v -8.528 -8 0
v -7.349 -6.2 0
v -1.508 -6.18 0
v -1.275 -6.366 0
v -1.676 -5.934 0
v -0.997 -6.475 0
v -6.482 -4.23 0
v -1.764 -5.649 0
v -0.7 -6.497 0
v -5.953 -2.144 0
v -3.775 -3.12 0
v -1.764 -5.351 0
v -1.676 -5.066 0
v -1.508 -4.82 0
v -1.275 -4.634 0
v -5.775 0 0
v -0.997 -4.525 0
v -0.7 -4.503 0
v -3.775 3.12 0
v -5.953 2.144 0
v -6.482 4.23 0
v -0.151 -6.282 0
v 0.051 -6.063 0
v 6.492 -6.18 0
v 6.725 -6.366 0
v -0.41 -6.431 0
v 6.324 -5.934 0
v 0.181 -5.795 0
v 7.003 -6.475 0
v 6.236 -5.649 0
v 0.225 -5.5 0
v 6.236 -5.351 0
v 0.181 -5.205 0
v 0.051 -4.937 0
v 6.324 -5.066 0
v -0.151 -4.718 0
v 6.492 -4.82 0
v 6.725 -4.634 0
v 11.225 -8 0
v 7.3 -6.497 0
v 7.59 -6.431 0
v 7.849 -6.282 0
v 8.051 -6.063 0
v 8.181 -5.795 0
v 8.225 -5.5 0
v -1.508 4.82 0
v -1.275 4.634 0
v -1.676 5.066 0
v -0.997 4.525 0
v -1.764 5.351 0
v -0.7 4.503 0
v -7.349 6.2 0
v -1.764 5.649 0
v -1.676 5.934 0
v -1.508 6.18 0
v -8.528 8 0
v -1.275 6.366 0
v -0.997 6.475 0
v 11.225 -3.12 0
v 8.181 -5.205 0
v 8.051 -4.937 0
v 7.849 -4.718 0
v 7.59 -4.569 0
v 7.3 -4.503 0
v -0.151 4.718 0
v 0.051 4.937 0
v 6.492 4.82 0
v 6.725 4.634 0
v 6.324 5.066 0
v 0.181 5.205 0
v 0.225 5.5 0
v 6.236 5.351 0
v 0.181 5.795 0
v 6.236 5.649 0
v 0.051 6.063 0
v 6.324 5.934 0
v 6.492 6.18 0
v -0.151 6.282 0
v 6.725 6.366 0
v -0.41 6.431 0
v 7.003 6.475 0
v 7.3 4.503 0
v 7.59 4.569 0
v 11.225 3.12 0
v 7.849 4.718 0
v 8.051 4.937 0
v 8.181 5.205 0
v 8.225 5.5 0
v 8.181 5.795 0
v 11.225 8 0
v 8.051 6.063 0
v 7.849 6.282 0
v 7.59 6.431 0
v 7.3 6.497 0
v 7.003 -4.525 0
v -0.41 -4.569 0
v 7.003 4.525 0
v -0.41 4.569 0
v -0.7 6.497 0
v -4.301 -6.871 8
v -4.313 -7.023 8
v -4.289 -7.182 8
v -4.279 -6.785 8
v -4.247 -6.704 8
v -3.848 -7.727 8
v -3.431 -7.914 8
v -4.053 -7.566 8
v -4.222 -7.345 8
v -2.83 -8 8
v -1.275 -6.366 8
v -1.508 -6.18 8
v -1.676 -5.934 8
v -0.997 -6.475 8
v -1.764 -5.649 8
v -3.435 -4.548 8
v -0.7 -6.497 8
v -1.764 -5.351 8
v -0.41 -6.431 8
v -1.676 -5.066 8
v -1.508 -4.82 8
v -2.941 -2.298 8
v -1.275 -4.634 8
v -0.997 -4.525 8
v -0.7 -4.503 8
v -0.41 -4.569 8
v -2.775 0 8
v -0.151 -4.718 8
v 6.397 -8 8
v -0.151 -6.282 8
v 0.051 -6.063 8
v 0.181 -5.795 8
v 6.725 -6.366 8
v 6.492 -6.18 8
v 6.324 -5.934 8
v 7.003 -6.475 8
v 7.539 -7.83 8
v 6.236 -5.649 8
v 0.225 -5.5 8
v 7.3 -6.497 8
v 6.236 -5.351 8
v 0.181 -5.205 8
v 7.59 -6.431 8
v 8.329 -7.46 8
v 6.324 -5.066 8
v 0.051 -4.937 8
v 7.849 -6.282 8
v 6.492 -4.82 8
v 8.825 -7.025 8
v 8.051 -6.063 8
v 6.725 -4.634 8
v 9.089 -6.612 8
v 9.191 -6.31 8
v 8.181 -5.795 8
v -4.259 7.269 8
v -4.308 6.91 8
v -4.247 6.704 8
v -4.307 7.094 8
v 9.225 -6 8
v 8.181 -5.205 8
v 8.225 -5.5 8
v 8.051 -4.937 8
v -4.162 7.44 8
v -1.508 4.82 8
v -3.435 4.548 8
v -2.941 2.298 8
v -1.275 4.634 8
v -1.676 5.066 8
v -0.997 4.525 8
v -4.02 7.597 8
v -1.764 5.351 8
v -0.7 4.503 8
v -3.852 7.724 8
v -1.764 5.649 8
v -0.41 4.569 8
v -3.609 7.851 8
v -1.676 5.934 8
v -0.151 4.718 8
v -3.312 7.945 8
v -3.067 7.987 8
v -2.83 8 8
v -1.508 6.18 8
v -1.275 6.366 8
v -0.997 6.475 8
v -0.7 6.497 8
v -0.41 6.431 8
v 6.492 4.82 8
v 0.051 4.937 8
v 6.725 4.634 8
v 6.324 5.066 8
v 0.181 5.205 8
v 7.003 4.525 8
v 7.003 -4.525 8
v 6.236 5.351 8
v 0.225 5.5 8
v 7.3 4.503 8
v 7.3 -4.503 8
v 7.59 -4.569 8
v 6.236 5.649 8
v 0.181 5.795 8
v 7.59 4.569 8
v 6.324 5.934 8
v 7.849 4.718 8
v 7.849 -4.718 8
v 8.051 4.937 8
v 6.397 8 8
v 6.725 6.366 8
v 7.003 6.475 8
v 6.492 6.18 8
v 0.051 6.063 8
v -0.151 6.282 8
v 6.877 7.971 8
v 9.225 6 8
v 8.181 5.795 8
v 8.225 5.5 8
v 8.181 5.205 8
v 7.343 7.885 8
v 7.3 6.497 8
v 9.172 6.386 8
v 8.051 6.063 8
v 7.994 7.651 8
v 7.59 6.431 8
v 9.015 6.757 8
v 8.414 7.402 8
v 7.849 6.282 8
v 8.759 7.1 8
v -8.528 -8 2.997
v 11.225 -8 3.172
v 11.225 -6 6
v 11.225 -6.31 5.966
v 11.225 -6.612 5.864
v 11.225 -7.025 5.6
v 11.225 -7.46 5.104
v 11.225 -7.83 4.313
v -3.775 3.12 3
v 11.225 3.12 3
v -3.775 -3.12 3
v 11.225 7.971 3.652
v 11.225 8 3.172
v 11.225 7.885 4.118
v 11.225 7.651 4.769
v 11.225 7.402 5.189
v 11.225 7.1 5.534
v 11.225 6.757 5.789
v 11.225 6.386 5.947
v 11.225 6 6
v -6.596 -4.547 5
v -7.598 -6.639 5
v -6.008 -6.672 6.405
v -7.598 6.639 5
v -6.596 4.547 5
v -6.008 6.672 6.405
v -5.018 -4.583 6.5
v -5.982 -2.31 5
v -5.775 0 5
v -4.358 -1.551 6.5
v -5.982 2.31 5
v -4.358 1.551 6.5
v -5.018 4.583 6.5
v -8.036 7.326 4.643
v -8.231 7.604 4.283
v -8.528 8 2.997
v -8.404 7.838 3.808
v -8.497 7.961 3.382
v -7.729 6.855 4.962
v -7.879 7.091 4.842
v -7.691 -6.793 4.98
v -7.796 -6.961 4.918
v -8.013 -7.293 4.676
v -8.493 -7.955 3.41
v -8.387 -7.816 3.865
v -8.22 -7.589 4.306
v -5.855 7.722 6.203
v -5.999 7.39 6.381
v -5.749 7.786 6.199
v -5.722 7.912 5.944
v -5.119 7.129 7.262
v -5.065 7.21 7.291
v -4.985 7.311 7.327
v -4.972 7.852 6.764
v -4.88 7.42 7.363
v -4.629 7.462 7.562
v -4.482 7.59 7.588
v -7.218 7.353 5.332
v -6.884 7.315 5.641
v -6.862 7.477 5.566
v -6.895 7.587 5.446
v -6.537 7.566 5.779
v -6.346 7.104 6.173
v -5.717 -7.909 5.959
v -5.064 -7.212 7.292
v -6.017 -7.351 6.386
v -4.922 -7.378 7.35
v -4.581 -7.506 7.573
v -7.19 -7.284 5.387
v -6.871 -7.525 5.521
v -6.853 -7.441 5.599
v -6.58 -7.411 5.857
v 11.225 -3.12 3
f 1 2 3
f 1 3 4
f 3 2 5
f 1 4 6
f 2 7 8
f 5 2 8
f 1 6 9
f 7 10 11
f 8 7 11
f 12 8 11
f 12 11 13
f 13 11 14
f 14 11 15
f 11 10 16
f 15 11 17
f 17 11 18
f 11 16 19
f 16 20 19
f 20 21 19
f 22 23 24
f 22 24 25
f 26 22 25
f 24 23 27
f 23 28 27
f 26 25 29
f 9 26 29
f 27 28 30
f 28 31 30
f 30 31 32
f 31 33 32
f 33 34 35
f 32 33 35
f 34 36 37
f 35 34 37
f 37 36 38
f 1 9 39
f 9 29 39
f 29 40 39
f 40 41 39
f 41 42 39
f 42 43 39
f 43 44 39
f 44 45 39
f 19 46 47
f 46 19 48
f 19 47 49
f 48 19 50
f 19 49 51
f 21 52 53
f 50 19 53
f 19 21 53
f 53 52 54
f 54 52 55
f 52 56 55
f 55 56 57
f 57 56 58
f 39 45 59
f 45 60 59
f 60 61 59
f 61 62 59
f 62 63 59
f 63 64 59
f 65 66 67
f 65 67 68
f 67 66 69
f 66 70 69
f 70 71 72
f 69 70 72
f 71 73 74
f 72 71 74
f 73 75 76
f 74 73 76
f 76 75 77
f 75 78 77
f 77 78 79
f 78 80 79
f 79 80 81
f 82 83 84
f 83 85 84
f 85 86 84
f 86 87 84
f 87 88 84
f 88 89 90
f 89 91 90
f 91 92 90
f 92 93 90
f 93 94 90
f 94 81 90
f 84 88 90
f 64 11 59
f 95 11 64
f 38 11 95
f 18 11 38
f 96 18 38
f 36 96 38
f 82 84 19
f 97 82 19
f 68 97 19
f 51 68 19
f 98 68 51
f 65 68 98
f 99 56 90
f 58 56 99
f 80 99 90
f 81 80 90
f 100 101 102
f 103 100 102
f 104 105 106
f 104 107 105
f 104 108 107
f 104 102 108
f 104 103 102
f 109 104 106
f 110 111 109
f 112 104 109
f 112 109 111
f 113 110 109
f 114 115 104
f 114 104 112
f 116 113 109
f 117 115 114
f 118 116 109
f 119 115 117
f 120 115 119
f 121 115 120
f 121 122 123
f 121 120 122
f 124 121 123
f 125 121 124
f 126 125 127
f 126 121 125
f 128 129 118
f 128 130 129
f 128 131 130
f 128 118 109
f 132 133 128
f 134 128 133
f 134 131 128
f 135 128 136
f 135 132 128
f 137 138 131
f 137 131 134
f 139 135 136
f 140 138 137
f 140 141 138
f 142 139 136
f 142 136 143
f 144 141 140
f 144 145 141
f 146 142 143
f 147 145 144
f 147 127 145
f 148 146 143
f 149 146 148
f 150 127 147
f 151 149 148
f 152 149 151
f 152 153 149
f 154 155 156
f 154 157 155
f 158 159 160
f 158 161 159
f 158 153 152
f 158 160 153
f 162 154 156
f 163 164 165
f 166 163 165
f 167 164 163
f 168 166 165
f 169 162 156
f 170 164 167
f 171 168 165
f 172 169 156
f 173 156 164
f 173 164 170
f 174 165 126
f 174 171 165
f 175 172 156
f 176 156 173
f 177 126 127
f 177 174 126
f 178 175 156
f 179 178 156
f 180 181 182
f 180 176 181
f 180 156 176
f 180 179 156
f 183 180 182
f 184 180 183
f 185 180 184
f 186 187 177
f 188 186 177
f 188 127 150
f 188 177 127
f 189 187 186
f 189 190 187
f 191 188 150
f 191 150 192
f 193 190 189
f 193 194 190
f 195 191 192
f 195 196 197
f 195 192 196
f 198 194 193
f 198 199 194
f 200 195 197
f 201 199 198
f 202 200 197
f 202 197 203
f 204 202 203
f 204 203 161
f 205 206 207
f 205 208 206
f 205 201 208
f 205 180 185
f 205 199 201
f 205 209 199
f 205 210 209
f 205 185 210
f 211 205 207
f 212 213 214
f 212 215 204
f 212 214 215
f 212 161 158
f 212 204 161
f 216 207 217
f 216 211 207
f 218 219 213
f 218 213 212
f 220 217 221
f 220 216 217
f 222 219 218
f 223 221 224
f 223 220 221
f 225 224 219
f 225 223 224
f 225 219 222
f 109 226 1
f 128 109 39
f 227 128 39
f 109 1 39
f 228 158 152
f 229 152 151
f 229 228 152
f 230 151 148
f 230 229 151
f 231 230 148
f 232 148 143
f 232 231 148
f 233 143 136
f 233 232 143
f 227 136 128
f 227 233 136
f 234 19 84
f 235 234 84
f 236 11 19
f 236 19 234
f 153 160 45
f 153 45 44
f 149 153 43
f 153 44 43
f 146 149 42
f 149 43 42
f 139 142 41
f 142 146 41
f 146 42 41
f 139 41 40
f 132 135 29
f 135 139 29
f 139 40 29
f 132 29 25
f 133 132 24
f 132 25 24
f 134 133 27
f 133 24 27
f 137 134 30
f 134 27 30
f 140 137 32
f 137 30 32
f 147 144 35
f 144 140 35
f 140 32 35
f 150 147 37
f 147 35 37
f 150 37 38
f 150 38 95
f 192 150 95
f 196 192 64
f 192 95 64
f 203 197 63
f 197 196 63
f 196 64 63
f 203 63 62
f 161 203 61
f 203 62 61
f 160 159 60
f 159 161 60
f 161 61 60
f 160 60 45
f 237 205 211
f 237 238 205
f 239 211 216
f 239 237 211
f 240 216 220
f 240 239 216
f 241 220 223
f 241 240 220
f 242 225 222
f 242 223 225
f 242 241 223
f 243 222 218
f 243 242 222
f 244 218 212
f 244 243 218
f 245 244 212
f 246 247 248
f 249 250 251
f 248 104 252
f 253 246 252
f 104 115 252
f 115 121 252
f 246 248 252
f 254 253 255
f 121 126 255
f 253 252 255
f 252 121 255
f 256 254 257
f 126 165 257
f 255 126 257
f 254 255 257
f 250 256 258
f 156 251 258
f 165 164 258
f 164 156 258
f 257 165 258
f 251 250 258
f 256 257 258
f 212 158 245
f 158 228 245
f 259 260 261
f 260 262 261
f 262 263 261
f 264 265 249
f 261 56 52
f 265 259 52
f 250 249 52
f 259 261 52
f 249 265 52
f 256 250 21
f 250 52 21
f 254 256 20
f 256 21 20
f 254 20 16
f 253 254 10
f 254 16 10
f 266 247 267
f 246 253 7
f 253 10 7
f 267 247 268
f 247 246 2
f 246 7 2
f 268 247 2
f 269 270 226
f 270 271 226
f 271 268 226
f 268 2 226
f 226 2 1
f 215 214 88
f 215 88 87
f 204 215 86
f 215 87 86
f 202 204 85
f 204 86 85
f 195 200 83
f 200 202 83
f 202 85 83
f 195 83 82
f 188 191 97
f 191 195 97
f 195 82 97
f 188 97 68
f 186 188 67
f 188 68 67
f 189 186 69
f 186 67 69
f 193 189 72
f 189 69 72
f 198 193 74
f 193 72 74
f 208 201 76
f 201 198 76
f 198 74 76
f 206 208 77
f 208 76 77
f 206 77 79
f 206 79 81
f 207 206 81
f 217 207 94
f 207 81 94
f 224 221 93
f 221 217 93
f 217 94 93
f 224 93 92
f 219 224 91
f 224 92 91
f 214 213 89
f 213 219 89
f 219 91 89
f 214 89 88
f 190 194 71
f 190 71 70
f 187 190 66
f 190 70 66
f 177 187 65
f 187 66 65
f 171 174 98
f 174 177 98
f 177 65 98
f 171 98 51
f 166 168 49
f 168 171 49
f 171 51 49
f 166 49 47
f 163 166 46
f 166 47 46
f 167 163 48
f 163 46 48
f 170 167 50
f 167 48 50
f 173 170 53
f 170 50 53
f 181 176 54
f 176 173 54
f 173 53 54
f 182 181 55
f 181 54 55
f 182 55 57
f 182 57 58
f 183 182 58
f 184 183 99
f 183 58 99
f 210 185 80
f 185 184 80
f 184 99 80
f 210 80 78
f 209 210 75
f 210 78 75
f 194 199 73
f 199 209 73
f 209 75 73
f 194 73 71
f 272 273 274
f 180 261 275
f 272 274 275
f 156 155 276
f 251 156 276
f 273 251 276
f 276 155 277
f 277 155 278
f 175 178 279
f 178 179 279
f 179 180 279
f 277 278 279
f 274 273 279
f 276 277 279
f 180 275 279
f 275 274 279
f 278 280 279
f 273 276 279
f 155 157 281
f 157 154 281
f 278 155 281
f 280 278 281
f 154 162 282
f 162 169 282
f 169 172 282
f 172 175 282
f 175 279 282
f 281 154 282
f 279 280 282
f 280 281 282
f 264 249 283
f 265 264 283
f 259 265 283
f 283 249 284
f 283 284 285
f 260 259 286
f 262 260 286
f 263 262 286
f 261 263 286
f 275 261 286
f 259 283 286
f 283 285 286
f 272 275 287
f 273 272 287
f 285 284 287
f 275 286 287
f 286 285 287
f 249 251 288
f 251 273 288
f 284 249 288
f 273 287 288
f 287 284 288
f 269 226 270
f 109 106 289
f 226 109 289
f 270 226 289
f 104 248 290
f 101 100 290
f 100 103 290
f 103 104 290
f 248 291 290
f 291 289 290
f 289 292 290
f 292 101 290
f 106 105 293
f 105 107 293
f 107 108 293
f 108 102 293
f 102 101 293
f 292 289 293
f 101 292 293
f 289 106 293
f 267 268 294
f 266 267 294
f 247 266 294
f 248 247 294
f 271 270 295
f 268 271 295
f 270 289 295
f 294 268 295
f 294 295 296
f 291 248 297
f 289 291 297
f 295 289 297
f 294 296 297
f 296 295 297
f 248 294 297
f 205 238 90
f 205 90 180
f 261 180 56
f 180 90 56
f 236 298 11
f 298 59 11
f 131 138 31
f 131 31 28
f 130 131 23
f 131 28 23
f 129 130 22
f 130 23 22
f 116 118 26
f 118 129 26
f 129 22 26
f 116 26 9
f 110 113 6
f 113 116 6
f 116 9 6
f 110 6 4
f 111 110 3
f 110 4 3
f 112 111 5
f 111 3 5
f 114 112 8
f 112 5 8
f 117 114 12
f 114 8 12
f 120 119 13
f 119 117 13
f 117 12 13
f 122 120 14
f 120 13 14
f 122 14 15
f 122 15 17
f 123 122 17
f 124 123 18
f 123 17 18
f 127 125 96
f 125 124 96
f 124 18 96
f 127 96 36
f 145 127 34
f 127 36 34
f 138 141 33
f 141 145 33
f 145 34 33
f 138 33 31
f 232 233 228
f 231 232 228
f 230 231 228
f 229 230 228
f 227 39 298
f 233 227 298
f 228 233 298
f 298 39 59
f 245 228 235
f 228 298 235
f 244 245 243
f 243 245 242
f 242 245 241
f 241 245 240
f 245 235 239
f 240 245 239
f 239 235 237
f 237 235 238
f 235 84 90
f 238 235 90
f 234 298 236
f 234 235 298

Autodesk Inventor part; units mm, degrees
ref_plane "YZ Plane" through (0, 0, 0) normal (1, 0, 0) x (0, 1, 0)
ref_plane "XZ Plane" through (0, 0, 0) normal (0, 1, 0) x (-1, 0, 0)
ref_plane "XY Plane" through (0, 0, 0) normal (0, 0, 1) x (1, 0, 0)
sketch "Sketch1" plane through (0, 0, 0) normal (0, 0, 1) x (1, 0, 0)
  circle A0 centre (-0.7749, 5.5) radius 1 projected
  circle A1 centre (7.2251, 5.5) radius 1 projected
  circle A2 centre (-0.7749, -5.5) radius 1 projected
  circle A3 centre (7.2251, -5.5) radius 1 projected
  line L0 (11.2251, -3) -> (-3.7749, -3) projected
  line L1 (-3.7749, -3) -> (-3.7749, 3) projected
  line L2 (-3.7749, 3) -> (11.2251, 3) projected
  line L3 (11.2251, 3) -> (11.2251, 8) projected
  line L4 (11.2251, 8) -> (-8.528, 8) projected
  arc A4 (-8.528, -8) -> (-8.528, 8) centre (-18.7749, 0) ccw projected
  line L5 (-8.528, -8) -> (11.2251, -8) projected
  line L6 (11.2251, -8) -> (11.2251, -3) projected
  point P0 (0, 0)
extrude "Extrusion1" add sketch "Sketch1" along normal blind 3
sketch "Sketch2" plane through (0, 0, 3) normal (0, 0, 1) x (1, 0, 0)
  line L0 (11.2251, -8) -> (11.2251, -3) projected
  line L1 (11.2251, -3) -> (-3.7749, -3) projected
  line L2 (-3.7749, -3) -> (-3.7749, 3) projected
  line L3 (-3.7749, 3) -> (11.2251, 3) projected
  line L4 (11.2251, 3) -> (11.2251, 8) projected
  line L5 (11.2251, 8) -> (-8.528, 8) projected
  arc A0 (-8.528, -8) -> (-8.528, 8) centre (-18.7749, 0) ccw projected
  line L6 (-8.528, -8) -> (11.2251, -8) projected
  circle A1 centre (-0.7749, 5.5) radius 1 projected
  circle A2 centre (7.2251, 5.5) radius 1 projected
  circle A3 centre (-0.7749, -5.5) radius 1 projected
  circle A4 centre (7.2251, -5.5) radius 1 projected
  line L7 (11.2251, -8) -> (11.2251, -3) projected
  line L8 (11.2251, 3) -> (11.2251, 8) projected
  line L9 (11.2251, -8) -> (11.2251, 8)
  point P0 (0, 0)
extrude "Extrusion2" add sketch "Sketch2" along normal blind 5
chamfer "Chamfer1" distance 3 angle 45 1 edges at (-5.7749, 0, 8)
fillet "Fillet1" radius 1 2 edges at (-6.817, -8, 6.3872) (-6.817, 8, 6.3872)
chamfer "Chamfer2" distance 2 angle 45 1 edges at (11.2251, 0, 8)
fillet "Fillet2" radius 2 2 edges at (10.2251, -8, 7) (10.2251, 8, 7)
thicken "Thicken1" operation add thickness 0.12 both sides no extend neighbours yes toward (0, 1, 0) faces at (1.2251, 3, 1)
thicken "Thicken2" operation add thickness 0.12 both sides no extend neighbours yes toward (0, -1, 0) faces at (6.2251, -3, 1)
properties part number "armtip_2"
